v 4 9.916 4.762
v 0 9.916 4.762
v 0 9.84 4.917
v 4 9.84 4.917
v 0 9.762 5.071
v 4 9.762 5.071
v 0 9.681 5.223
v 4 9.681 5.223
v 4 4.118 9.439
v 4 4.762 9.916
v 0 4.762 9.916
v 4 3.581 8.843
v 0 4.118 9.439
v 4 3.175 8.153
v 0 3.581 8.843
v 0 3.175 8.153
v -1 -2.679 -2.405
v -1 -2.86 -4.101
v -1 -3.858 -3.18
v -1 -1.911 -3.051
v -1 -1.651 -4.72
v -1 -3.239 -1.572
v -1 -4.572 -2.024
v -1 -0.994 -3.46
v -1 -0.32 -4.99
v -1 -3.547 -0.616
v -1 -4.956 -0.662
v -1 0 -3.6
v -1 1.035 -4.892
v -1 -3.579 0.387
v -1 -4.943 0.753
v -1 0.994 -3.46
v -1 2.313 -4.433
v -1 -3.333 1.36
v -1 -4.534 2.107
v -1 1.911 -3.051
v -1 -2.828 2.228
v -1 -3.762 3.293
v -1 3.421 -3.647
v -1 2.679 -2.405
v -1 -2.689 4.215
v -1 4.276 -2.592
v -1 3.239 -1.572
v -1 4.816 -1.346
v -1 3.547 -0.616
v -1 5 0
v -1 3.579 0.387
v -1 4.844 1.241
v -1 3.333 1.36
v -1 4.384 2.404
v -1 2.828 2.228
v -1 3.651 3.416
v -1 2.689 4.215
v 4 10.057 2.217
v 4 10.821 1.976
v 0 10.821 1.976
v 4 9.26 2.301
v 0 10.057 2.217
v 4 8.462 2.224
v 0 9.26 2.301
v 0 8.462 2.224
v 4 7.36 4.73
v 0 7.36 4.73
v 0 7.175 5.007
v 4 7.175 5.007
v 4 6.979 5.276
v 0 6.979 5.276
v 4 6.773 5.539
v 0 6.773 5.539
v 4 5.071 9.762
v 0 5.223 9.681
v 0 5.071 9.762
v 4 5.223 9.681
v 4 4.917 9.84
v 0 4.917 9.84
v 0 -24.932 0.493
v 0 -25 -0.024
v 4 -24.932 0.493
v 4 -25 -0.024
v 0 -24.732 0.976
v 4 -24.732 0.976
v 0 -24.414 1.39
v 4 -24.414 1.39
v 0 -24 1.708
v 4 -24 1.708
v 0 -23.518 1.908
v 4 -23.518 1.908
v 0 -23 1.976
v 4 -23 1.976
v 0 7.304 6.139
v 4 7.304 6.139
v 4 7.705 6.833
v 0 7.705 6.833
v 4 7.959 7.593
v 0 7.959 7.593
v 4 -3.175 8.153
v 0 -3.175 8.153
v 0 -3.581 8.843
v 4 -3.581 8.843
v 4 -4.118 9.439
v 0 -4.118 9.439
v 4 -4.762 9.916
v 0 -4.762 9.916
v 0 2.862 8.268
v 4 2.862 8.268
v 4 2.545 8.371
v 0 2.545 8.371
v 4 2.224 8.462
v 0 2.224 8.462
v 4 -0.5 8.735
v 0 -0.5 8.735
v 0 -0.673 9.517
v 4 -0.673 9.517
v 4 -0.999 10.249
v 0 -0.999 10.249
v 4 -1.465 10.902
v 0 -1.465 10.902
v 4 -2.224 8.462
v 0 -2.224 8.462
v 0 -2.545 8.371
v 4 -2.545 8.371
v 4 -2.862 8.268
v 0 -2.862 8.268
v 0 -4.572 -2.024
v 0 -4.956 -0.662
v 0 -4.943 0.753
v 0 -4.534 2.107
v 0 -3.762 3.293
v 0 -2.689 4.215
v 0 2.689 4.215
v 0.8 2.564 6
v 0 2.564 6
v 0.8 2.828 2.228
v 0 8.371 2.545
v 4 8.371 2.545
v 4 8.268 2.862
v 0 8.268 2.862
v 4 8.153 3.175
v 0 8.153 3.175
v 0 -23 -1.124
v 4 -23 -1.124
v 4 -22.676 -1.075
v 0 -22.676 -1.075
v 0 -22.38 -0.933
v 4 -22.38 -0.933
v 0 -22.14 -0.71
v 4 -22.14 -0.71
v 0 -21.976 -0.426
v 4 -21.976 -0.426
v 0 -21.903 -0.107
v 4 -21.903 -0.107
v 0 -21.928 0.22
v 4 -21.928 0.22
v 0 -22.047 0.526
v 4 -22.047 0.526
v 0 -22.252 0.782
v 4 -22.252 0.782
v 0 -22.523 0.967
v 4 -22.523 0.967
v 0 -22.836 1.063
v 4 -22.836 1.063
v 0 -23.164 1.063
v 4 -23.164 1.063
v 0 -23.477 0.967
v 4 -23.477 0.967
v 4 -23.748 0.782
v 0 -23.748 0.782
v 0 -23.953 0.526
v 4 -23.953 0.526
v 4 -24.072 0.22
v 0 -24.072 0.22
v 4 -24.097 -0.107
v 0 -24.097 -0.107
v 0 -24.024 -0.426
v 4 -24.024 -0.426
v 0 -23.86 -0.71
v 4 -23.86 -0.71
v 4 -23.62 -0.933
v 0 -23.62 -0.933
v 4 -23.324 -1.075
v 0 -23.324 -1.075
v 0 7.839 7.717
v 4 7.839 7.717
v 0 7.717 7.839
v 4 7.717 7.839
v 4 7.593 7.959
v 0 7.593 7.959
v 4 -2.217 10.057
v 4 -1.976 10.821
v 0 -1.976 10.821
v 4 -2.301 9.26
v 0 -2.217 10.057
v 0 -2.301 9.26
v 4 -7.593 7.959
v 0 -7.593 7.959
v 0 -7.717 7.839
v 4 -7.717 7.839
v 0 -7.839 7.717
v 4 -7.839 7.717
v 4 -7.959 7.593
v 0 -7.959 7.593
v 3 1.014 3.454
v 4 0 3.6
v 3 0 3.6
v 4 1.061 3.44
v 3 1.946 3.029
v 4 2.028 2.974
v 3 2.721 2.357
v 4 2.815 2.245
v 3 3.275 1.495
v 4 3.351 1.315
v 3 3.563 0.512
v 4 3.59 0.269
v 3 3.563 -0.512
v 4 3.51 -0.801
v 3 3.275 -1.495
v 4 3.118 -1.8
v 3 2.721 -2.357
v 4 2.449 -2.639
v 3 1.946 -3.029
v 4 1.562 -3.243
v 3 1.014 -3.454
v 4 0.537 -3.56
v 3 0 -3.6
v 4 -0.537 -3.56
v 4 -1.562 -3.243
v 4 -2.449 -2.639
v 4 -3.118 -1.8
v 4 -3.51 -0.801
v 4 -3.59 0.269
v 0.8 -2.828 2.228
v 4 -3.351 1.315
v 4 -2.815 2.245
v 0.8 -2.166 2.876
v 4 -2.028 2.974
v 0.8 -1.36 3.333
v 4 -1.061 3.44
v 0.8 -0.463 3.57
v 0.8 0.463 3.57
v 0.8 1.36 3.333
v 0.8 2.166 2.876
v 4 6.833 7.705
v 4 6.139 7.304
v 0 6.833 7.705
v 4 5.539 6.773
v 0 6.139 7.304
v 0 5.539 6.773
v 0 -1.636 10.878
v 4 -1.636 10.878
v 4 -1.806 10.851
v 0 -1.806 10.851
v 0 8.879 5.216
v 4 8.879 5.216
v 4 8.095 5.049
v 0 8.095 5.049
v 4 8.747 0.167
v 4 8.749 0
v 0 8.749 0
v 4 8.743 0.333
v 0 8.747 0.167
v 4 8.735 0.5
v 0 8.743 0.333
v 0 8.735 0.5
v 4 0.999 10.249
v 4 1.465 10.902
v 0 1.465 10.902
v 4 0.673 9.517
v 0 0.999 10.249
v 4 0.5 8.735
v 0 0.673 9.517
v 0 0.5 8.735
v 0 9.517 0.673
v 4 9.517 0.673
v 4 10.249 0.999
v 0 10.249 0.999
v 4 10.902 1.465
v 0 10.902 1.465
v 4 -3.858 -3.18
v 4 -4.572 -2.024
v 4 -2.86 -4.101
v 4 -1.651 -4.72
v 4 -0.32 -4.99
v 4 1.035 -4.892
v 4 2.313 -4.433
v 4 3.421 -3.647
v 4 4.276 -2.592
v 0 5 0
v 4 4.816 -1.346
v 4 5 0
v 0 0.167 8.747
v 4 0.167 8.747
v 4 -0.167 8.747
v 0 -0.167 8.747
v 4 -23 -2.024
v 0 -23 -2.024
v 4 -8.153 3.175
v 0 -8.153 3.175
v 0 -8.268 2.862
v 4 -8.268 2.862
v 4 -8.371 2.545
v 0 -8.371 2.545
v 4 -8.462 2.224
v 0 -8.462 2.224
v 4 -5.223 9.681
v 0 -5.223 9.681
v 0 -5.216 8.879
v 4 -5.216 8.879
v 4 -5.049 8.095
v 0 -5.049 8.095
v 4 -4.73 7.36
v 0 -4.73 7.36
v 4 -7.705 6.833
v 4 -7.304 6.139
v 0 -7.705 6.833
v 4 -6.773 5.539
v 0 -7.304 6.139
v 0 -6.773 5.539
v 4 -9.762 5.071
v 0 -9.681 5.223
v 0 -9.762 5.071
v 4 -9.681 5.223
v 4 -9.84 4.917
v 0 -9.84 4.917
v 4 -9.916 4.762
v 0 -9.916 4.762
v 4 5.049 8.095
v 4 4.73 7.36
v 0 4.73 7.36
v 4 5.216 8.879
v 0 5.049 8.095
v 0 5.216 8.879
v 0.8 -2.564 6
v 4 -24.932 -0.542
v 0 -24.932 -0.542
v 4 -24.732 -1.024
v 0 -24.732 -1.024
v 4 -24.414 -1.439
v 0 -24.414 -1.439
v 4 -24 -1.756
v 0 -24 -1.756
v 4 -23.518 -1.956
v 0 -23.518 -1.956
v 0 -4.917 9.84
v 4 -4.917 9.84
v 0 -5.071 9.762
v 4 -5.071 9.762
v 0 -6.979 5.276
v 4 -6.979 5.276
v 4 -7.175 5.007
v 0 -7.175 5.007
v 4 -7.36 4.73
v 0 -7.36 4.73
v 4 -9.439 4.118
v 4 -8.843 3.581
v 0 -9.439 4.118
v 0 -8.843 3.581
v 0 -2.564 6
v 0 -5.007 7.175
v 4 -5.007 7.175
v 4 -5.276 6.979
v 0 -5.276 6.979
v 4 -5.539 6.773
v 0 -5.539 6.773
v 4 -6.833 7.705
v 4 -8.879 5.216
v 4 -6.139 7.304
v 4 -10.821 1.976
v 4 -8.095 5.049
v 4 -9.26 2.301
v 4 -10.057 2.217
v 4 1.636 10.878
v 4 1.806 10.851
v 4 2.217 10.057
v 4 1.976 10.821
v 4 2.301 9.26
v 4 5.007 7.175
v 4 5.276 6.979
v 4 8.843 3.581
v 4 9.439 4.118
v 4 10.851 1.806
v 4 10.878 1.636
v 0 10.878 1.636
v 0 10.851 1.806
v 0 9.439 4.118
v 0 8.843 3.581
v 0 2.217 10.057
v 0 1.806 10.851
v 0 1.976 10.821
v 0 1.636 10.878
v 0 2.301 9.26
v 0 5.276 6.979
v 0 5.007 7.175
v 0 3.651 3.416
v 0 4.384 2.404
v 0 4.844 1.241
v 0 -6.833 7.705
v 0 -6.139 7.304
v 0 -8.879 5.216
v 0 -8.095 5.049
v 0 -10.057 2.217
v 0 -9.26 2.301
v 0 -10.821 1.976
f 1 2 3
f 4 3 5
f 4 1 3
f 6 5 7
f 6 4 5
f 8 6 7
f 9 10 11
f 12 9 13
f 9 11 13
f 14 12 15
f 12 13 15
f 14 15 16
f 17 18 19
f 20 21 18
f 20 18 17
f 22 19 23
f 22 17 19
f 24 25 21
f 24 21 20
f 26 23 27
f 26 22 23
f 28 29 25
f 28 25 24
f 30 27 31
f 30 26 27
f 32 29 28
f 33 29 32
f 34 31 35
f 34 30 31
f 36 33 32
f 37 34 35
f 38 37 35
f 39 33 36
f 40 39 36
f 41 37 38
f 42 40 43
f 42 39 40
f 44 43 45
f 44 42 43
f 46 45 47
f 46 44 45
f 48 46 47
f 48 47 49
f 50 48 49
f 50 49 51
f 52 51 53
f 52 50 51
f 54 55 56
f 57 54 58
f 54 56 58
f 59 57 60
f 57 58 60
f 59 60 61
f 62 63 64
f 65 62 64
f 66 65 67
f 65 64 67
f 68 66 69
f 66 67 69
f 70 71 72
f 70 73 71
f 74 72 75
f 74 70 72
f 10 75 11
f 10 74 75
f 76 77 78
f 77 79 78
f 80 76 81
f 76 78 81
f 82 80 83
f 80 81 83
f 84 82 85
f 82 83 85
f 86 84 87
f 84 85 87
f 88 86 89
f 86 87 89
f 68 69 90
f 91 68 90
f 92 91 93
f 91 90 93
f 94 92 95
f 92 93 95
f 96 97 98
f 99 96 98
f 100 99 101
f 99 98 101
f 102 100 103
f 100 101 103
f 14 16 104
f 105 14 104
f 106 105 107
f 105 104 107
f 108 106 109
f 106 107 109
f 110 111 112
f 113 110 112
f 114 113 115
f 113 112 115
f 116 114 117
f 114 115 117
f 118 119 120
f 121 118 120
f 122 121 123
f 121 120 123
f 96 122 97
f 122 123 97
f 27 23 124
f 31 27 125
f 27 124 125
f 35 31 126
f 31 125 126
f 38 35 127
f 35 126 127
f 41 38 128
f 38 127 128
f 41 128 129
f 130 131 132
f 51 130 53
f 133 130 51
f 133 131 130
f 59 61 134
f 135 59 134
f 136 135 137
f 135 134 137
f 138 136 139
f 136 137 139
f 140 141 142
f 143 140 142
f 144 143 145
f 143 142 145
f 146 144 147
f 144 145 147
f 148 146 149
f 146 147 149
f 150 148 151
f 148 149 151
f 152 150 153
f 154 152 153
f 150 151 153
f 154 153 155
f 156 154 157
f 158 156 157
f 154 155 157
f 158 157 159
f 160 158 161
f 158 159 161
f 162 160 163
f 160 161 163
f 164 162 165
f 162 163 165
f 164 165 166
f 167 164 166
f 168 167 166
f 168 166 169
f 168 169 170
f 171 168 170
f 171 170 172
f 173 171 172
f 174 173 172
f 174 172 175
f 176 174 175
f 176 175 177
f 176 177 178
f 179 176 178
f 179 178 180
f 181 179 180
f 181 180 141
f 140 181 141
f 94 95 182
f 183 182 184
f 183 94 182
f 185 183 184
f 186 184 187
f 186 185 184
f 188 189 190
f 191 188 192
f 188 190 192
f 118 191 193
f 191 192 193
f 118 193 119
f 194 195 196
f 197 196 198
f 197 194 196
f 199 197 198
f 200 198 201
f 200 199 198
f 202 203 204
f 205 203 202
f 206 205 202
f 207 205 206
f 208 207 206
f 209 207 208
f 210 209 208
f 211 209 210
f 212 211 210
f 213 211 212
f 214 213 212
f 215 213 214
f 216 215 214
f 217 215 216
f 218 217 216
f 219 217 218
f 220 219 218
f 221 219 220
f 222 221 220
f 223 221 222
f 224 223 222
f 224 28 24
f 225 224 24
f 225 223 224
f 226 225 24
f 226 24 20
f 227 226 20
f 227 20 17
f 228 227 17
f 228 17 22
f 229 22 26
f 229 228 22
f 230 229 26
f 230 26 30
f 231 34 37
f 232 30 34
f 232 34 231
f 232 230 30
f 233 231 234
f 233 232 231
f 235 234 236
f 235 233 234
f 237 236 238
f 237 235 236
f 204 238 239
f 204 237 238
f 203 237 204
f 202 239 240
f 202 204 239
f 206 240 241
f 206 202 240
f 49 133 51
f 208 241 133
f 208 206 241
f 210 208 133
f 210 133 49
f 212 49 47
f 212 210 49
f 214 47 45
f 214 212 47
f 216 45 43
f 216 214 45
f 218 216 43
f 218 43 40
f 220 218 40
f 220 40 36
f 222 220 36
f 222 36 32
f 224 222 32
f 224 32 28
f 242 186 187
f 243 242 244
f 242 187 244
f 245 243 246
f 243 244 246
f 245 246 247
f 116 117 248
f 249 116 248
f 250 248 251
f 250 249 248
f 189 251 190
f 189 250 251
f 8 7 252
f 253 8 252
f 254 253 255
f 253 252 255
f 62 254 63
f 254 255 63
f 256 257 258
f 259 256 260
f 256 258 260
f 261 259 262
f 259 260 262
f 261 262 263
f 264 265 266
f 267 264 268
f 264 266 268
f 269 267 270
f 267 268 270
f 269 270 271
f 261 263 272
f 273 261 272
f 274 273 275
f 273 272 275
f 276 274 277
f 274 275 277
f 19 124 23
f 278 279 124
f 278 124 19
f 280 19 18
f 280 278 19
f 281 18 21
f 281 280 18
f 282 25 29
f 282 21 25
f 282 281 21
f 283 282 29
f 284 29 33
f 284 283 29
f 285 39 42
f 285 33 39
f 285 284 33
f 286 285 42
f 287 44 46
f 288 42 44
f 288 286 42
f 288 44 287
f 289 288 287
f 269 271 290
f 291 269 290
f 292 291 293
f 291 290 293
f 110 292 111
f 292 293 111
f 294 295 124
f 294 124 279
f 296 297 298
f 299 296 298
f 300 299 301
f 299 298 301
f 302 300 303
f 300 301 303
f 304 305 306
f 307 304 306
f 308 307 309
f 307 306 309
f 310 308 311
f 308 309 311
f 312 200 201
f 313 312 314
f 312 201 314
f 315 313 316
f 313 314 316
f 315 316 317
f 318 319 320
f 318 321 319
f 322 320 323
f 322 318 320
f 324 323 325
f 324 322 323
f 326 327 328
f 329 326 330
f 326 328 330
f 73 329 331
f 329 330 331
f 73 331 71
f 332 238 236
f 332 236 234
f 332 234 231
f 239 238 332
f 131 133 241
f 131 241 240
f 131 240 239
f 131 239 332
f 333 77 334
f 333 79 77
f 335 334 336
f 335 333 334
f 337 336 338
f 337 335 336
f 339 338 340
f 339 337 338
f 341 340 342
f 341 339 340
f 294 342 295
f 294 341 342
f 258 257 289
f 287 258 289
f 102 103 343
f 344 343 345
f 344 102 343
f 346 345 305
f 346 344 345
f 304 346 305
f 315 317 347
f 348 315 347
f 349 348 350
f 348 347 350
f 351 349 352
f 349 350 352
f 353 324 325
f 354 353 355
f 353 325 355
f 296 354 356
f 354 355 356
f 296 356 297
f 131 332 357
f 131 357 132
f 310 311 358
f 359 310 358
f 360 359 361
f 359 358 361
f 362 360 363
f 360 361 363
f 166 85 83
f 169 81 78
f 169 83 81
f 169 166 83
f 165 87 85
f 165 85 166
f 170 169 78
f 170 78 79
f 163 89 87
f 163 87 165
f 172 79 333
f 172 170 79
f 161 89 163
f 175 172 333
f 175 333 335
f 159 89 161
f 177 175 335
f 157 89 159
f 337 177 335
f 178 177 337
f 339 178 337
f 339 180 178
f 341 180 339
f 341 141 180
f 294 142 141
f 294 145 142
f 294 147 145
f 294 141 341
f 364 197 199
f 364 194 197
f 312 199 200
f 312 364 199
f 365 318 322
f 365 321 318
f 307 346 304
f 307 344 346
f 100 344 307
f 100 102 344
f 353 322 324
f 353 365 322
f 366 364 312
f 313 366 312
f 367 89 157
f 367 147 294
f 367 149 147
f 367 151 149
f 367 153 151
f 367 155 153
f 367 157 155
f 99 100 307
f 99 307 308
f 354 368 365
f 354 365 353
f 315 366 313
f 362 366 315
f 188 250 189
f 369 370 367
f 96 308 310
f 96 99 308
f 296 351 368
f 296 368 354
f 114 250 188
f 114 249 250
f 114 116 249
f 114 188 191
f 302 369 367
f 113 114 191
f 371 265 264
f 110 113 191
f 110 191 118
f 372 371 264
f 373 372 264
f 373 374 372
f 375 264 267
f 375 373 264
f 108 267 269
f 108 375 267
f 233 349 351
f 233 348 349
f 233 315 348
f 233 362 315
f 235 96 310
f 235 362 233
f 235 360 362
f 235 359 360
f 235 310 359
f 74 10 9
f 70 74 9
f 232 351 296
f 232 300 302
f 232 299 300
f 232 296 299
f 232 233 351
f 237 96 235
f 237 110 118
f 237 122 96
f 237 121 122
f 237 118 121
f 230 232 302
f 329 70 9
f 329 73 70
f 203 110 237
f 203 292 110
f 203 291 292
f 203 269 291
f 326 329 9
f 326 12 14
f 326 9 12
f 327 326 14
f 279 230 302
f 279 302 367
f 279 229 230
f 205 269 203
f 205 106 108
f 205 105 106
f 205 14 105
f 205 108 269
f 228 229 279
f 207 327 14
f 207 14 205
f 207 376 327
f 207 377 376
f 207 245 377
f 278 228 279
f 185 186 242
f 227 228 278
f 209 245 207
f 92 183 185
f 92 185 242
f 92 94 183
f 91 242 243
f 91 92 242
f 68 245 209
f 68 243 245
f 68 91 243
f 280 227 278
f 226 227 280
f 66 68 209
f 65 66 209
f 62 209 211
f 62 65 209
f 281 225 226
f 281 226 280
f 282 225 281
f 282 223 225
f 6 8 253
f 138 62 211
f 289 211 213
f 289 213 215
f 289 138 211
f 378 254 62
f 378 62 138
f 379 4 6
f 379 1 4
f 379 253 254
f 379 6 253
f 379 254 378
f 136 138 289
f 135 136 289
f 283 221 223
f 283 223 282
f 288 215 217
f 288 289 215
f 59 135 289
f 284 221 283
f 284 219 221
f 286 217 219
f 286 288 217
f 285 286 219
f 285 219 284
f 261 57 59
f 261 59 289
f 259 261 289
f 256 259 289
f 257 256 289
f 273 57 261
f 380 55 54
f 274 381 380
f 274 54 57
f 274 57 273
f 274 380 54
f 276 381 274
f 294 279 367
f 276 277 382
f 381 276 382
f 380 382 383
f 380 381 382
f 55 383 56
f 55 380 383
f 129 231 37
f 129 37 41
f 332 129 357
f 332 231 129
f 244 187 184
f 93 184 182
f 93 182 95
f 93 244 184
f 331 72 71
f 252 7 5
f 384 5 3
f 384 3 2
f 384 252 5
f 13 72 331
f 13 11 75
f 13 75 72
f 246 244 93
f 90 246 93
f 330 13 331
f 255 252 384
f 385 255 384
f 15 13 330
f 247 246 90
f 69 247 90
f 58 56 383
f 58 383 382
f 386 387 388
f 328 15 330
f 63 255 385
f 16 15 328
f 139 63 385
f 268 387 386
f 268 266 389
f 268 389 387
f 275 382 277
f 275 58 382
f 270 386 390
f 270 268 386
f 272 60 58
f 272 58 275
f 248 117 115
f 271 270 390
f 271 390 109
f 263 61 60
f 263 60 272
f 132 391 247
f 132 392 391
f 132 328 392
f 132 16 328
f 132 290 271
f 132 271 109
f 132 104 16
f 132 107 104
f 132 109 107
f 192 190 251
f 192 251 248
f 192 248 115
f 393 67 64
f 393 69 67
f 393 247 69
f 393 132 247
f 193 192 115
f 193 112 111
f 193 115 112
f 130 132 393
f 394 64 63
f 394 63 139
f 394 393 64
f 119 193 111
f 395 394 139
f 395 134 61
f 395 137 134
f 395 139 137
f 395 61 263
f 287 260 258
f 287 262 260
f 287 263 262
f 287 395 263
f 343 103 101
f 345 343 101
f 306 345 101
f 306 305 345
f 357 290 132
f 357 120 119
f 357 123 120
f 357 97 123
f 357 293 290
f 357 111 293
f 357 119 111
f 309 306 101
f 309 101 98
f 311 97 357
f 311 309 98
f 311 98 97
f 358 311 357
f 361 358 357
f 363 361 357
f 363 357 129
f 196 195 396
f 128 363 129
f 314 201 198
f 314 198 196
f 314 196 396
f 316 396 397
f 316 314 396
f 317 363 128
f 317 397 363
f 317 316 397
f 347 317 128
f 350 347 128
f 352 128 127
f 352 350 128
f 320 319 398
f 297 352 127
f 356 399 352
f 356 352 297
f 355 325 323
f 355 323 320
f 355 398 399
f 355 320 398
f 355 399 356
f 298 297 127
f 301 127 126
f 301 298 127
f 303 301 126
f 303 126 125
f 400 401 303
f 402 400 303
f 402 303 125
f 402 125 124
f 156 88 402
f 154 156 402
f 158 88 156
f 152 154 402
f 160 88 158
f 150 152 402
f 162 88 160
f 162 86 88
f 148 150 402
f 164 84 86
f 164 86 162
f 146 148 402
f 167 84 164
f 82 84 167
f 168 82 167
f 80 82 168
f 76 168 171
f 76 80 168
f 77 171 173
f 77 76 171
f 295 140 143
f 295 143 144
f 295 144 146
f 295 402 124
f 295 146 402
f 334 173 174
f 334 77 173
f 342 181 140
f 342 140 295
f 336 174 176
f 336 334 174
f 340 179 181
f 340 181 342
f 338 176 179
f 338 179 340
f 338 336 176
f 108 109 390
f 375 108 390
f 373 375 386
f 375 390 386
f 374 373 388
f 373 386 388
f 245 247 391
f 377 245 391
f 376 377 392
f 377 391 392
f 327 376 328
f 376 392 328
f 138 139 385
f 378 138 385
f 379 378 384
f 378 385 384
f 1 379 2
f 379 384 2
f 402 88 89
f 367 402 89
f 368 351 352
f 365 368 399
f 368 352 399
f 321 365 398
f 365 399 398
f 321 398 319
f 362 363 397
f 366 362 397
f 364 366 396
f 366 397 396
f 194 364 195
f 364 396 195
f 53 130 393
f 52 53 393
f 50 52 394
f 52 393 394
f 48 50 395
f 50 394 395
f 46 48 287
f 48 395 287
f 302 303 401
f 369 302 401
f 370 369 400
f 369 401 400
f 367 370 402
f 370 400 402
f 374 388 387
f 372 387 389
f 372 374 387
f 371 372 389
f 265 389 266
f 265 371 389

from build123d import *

# Parameters (mm, degrees)
BASPROSKE_W         = 4
BASPROSKE_H         = 11
TOOTHCUT_DEPTH      = 17.062378404
TEETHCUTS_COUNT     = 20
TEETHCUTS_ANGLE     = 342
BORSKE_R            = 1
BORE_DEPTH          = 50.0000508
CUT_EXTRUDE_1_DEPTH = 10
EXTRUDE_1_REACH     = 39.733
SKETCH_3_W          = 4
SKETCH_3_H          = 4
FILLET_1_R          = 2
SKETCH_4_R          = 1.1
CUT_EXTRUDE_2_DEPTH = 10
EXTRUDE_START       = -4
SKETCH_5_R          = 1
EXTRUDE_2_DEPTH     = 4
EXTRUDE_3_DEPTH     = 1
EXTRUDE_START_2     = 4
EXTRUDE_4_DEPTH     = 4
SKETCH_8_R          = 3.6
CUT_EXTRUDE_3_DEPTH = 3.2
CUT_EXTRUDE_START   = -23.2
SKETCH_10_R         = 3.6
CUT_EXTRUDE_4_DEPTH = 23.2
SKETCH_11_R         = 3.6
EXTRUDE_5_DEPTH     = 1
CUT_EXTRUDE_START_2 = -1
SKETCH_12_R         = 3.6
CUT_EXTRUDE_5_DEPTH = 1
CUT_EXTRUDE_START_3 = -1.8
CUT_EXTRUDE_6_DEPTH = 1.8


with BuildPart() as part:
    # BasProSke → Base-Revolve (revolve)
    with BuildSketch(Plane(origin=(0, 0, 0), x_dir=(1, 0, 0), z_dir=(0, 1, 0)), mode=Mode.PRIVATE) as base_revolve_sk:
        with Locations((2, 5.5)):
            Rectangle(BASPROSKE_W, BASPROSKE_H)
    revolve(base_revolve_sk.sketch.rotate(Axis((-10, 0, 0), (1, 0, 0)), 180), axis=Axis((-10, 0, 0), (1, 0, 0)))

    # TooCutSke → ToothCut (cut, through all)
    with BuildSketch(Plane(origin=(0, 0, 0), x_dir=(0, 0, -1), z_dir=(1, 0, 0))):
        with BuildLine():
            ThreePointArc((0.499924007, 8.734705318), (0, 8.749), (-0.499924007, 8.734705318))
            ThreePointArc((-0.499924007, 8.734705318), (-0.824302243, 9.905497836), (-1.485192705, 10.924909509))
            ThreePointArc((-1.485192705, 10.924909509), (0, 11.0254), (1.485192705, 10.924909509))
            ThreePointArc((1.485192705, 10.924909509), (0.824302243, 9.905497836), (0.499924007, 8.734705318))
        make_face()
    toothcut = extrude(amount=TOOTHCUT_DEPTH, mode=Mode.SUBTRACT)

    # TeethCuts: ToothCut ×20 about axis
    teethcuts_axis = Axis((-10, 0, 0), (1, 0, 0))
    for i in range(1, TEETHCUTS_COUNT):
        add(toothcut.rotate(teethcuts_axis, i * TEETHCUTS_ANGLE / (TEETHCUTS_COUNT - 1)), mode=Mode.SUBTRACT)

    # BorSke → Bore (cut, symmetric)
    with BuildSketch(Plane(origin=(0, 0, 0), x_dir=(0, 0, -1), z_dir=(1, 0, 0))):
        with Locations(Location((0, 0, 0), (0, 0, 180))):
            Circle(BORSKE_R)
    extrude(amount=BORE_DEPTH, both=True, mode=Mode.SUBTRACT)

    # 草图1 → 切除-拉伸1 (cut)
    with BuildSketch(Plane(origin=(4, 0, 0), x_dir=(0, 0, -1), z_dir=(1, 0, 0))):
        with BuildLine():
            Line((0, 12.401538845), (0, 2.5))
            ThreePointArc((0, 2.5), (1.767766953, 1.767766953), (2.5, 0))
            ThreePointArc((2.5, 0), (1.767766953, -1.767766953), (0, -2.5))
            Line((0, -2.5), (0, -15.030002789))
            Line((0, -15.030002789), (15.193341894, -15.030002789))
            Line((15.193341894, -15.030002789), (15.193341894, 12.401538845))
            Line((15.193341894, 12.401538845), (0, 12.401538845))
        make_face()
    extrude(amount=-CUT_EXTRUDE_1_DEPTH, mode=Mode.SUBTRACT)

    # 草图3 → 凸台-拉伸1 (add, up to next)
    with BuildSketch(Plane(origin=(0, -25, 0), x_dir=(1, 0, 0), z_dir=(0, 1, 0)), mode=Mode.PRIVATE) as extrude_1_sk1:
        with Locations((2, 0.024348859)):
            Rectangle(SKETCH_3_W, SKETCH_3_H)
    extrude_1_tool1 = extrude(extrude_1_sk1.sketch, amount=EXTRUDE_1_REACH, mode=Mode.PRIVATE) - part.part
    add(extrude_1_tool1.solids().sort_by_distance((2, -25, -0.024349))[0])

    # 圆角1
    fillet_1_edges = [part.edges().sort_by_distance(p)[0] for p in [
        (2, -25, 1.975651141),
        (2, -25, -2.024348859),
    ]]
    fillet(fillet_1_edges, radius=FILLET_1_R - 0.0001)  # a hair under: the kernel refuses the full size

    # 草图4 → 切除-拉伸2 (cut)
    with BuildSketch(Plane(origin=(4, 0, 0), x_dir=(0, 0, -1), z_dir=(1, 0, 0))):
        with Locations((0.024348859, -23)):
            Circle(SKETCH_4_R)
    extrude(amount=-CUT_EXTRUDE_2_DEPTH, mode=Mode.SUBTRACT)

    # 草图5 → 凸台-拉伸2 (add)
    with BuildSketch(Plane.ZY.offset(EXTRUDE_START)):
        Circle(SKETCH_5_R)
    extrude(amount=EXTRUDE_2_DEPTH)

    # 草图6 → 凸台-拉伸3 (add)
    with BuildSketch(Plane.ZY):
        with BuildLine():
            Line((0, 5), (0, 2.5))
            ThreePointArc((0, 2.5), (-2.226817699, 1.136346309), (-2.024348859, -1.466973653))
            Line((-2.024348859, -1.466973653), (-2.024348859, -4.571871794))
            ThreePointArc((-2.024348859, -4.571871794), (2.727476463, -4.19056943), (5, 0))
            ThreePointArc((5, 0), (3.535533906, 3.535533906), (0, 5))
        make_face()
        with BuildLine():
            ThreePointArc((-2.024348859, -1.466973653), (-2.226817699, 1.136346309), (0, 2.5))
            Line((0, 2.5), (0, 5))
            ThreePointArc((0, 5), (-4.891797163, 1.034562959), (-2.024348859, -4.571871794))
            Line((-2.024348859, -4.571871794), (-2.024348859, -1.466973653))
        make_face()
        with BuildLine():
            Line((0, 5), (0, 2.5))
            ThreePointArc((0, 2.5), (-2.226817699, 1.136346309), (-2.024348859, -1.466973653))
            Line((-2.024348859, -1.466973653), (-2.024348859, -4.571871794))
            ThreePointArc((-2.024348859, -4.571871794), (2.727476463, -4.19056943), (5, 0))
            ThreePointArc((5, 0), (3.535533906, 3.535533906), (0, 5))
        make_face()
        with BuildLine():
            ThreePointArc((-2.024348859, -1.466973653), (-2.226817699, 1.136346309), (0, 2.5))
            Line((0, 2.5), (0, 5))
            ThreePointArc((0, 5), (-4.891797163, 1.034562959), (-2.024348859, -4.571871794))
            Line((-2.024348859, -4.571871794), (-2.024348859, -1.466973653))
        make_face()
    extrude(amount=EXTRUDE_3_DEPTH)

    # 草图7 → 凸台-拉伸4 (add)
    with BuildSketch(Plane(origin=(0, 0, 0), x_dir=(0, 0, -1), z_dir=(1, 0, 0)).offset(EXTRUDE_START_2)):
        with BuildLine():
            Line((0, 5), (0, 2.5))
            ThreePointArc((0, 2.5), (2.226817699, 1.136346309), (2.024348859, -1.466973653))
            Line((2.024348859, -1.466973653), (2.024348859, -4.571871794))
            ThreePointArc((2.024348859, -4.571871794), (4.891797163, 1.034562959), (0, 5))
        make_face()
    extrude(amount=-EXTRUDE_4_DEPTH)

    # 草图8 → 切除-拉伸3 (cut)
    with BuildSketch(Plane(origin=(4, 0, 0), x_dir=(0, 0, -1), z_dir=(1, 0, 0))):
        Circle(SKETCH_8_R)
    extrude(amount=-CUT_EXTRUDE_3_DEPTH, mode=Mode.SUBTRACT)

    # 草图10 → 切除-拉伸4 (cut)
    with BuildSketch(Plane.ZY.offset(1).offset(CUT_EXTRUDE_START)):
        with Locations(Location((0, 0, 0), (0, 0, 180))):
            Circle(SKETCH_10_R)
    extrude(amount=CUT_EXTRUDE_4_DEPTH, mode=Mode.SUBTRACT)

    # 草图11 → 凸台-拉伸5 (add)
    with BuildSketch(Plane(origin=(4, 0, 0), x_dir=(0, 0, -1), z_dir=(1, 0, 0))):
        Circle(SKETCH_11_R)
    extrude(amount=-EXTRUDE_5_DEPTH)

    # 草图12 → 切除-拉伸5 (cut)
    with BuildSketch(Plane.ZY.offset(-3).offset(CUT_EXTRUDE_START_2)):
        Circle(SKETCH_12_R)
    extrude(amount=CUT_EXTRUDE_5_DEPTH, mode=Mode.SUBTRACT)

    # 草图13 → 切除-拉伸6 (cut)
    with BuildSketch(Plane.ZY.offset(1).offset(CUT_EXTRUDE_START_3)):
        with BuildLine():
            Line((6, 2.564298292), (2.227527106, 2.828095294))
            ThreePointArc((2.227527106, 2.828095294), (3.6, 0), (2.227527106, -2.828095294))
            Line((2.227527106, -2.828095294), (6, -2.564298292))
            Line((6, -2.564298292), (6, 2.564298292))
        make_face()
    extrude(amount=CUT_EXTRUDE_6_DEPTH, mode=Mode.SUBTRACT)


solid = part.part
